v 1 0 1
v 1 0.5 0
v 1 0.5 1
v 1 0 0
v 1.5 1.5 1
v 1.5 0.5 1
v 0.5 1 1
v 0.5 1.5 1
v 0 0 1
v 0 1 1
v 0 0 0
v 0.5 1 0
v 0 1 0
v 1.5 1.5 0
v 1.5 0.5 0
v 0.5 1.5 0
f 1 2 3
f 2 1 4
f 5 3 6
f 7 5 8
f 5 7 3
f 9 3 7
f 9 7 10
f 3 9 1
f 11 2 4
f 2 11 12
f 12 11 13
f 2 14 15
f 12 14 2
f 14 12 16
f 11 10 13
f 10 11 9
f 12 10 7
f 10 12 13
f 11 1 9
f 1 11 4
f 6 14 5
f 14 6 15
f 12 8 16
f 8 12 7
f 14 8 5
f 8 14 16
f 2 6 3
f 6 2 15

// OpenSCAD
intersection() {
  union() {
    cube(1);
    translate([0.5, 0.5, 0]) cube(1);
  }
  cube(10, center=1); // Just to ensure fast-union doesn't drop the union above we're trying to test
}
